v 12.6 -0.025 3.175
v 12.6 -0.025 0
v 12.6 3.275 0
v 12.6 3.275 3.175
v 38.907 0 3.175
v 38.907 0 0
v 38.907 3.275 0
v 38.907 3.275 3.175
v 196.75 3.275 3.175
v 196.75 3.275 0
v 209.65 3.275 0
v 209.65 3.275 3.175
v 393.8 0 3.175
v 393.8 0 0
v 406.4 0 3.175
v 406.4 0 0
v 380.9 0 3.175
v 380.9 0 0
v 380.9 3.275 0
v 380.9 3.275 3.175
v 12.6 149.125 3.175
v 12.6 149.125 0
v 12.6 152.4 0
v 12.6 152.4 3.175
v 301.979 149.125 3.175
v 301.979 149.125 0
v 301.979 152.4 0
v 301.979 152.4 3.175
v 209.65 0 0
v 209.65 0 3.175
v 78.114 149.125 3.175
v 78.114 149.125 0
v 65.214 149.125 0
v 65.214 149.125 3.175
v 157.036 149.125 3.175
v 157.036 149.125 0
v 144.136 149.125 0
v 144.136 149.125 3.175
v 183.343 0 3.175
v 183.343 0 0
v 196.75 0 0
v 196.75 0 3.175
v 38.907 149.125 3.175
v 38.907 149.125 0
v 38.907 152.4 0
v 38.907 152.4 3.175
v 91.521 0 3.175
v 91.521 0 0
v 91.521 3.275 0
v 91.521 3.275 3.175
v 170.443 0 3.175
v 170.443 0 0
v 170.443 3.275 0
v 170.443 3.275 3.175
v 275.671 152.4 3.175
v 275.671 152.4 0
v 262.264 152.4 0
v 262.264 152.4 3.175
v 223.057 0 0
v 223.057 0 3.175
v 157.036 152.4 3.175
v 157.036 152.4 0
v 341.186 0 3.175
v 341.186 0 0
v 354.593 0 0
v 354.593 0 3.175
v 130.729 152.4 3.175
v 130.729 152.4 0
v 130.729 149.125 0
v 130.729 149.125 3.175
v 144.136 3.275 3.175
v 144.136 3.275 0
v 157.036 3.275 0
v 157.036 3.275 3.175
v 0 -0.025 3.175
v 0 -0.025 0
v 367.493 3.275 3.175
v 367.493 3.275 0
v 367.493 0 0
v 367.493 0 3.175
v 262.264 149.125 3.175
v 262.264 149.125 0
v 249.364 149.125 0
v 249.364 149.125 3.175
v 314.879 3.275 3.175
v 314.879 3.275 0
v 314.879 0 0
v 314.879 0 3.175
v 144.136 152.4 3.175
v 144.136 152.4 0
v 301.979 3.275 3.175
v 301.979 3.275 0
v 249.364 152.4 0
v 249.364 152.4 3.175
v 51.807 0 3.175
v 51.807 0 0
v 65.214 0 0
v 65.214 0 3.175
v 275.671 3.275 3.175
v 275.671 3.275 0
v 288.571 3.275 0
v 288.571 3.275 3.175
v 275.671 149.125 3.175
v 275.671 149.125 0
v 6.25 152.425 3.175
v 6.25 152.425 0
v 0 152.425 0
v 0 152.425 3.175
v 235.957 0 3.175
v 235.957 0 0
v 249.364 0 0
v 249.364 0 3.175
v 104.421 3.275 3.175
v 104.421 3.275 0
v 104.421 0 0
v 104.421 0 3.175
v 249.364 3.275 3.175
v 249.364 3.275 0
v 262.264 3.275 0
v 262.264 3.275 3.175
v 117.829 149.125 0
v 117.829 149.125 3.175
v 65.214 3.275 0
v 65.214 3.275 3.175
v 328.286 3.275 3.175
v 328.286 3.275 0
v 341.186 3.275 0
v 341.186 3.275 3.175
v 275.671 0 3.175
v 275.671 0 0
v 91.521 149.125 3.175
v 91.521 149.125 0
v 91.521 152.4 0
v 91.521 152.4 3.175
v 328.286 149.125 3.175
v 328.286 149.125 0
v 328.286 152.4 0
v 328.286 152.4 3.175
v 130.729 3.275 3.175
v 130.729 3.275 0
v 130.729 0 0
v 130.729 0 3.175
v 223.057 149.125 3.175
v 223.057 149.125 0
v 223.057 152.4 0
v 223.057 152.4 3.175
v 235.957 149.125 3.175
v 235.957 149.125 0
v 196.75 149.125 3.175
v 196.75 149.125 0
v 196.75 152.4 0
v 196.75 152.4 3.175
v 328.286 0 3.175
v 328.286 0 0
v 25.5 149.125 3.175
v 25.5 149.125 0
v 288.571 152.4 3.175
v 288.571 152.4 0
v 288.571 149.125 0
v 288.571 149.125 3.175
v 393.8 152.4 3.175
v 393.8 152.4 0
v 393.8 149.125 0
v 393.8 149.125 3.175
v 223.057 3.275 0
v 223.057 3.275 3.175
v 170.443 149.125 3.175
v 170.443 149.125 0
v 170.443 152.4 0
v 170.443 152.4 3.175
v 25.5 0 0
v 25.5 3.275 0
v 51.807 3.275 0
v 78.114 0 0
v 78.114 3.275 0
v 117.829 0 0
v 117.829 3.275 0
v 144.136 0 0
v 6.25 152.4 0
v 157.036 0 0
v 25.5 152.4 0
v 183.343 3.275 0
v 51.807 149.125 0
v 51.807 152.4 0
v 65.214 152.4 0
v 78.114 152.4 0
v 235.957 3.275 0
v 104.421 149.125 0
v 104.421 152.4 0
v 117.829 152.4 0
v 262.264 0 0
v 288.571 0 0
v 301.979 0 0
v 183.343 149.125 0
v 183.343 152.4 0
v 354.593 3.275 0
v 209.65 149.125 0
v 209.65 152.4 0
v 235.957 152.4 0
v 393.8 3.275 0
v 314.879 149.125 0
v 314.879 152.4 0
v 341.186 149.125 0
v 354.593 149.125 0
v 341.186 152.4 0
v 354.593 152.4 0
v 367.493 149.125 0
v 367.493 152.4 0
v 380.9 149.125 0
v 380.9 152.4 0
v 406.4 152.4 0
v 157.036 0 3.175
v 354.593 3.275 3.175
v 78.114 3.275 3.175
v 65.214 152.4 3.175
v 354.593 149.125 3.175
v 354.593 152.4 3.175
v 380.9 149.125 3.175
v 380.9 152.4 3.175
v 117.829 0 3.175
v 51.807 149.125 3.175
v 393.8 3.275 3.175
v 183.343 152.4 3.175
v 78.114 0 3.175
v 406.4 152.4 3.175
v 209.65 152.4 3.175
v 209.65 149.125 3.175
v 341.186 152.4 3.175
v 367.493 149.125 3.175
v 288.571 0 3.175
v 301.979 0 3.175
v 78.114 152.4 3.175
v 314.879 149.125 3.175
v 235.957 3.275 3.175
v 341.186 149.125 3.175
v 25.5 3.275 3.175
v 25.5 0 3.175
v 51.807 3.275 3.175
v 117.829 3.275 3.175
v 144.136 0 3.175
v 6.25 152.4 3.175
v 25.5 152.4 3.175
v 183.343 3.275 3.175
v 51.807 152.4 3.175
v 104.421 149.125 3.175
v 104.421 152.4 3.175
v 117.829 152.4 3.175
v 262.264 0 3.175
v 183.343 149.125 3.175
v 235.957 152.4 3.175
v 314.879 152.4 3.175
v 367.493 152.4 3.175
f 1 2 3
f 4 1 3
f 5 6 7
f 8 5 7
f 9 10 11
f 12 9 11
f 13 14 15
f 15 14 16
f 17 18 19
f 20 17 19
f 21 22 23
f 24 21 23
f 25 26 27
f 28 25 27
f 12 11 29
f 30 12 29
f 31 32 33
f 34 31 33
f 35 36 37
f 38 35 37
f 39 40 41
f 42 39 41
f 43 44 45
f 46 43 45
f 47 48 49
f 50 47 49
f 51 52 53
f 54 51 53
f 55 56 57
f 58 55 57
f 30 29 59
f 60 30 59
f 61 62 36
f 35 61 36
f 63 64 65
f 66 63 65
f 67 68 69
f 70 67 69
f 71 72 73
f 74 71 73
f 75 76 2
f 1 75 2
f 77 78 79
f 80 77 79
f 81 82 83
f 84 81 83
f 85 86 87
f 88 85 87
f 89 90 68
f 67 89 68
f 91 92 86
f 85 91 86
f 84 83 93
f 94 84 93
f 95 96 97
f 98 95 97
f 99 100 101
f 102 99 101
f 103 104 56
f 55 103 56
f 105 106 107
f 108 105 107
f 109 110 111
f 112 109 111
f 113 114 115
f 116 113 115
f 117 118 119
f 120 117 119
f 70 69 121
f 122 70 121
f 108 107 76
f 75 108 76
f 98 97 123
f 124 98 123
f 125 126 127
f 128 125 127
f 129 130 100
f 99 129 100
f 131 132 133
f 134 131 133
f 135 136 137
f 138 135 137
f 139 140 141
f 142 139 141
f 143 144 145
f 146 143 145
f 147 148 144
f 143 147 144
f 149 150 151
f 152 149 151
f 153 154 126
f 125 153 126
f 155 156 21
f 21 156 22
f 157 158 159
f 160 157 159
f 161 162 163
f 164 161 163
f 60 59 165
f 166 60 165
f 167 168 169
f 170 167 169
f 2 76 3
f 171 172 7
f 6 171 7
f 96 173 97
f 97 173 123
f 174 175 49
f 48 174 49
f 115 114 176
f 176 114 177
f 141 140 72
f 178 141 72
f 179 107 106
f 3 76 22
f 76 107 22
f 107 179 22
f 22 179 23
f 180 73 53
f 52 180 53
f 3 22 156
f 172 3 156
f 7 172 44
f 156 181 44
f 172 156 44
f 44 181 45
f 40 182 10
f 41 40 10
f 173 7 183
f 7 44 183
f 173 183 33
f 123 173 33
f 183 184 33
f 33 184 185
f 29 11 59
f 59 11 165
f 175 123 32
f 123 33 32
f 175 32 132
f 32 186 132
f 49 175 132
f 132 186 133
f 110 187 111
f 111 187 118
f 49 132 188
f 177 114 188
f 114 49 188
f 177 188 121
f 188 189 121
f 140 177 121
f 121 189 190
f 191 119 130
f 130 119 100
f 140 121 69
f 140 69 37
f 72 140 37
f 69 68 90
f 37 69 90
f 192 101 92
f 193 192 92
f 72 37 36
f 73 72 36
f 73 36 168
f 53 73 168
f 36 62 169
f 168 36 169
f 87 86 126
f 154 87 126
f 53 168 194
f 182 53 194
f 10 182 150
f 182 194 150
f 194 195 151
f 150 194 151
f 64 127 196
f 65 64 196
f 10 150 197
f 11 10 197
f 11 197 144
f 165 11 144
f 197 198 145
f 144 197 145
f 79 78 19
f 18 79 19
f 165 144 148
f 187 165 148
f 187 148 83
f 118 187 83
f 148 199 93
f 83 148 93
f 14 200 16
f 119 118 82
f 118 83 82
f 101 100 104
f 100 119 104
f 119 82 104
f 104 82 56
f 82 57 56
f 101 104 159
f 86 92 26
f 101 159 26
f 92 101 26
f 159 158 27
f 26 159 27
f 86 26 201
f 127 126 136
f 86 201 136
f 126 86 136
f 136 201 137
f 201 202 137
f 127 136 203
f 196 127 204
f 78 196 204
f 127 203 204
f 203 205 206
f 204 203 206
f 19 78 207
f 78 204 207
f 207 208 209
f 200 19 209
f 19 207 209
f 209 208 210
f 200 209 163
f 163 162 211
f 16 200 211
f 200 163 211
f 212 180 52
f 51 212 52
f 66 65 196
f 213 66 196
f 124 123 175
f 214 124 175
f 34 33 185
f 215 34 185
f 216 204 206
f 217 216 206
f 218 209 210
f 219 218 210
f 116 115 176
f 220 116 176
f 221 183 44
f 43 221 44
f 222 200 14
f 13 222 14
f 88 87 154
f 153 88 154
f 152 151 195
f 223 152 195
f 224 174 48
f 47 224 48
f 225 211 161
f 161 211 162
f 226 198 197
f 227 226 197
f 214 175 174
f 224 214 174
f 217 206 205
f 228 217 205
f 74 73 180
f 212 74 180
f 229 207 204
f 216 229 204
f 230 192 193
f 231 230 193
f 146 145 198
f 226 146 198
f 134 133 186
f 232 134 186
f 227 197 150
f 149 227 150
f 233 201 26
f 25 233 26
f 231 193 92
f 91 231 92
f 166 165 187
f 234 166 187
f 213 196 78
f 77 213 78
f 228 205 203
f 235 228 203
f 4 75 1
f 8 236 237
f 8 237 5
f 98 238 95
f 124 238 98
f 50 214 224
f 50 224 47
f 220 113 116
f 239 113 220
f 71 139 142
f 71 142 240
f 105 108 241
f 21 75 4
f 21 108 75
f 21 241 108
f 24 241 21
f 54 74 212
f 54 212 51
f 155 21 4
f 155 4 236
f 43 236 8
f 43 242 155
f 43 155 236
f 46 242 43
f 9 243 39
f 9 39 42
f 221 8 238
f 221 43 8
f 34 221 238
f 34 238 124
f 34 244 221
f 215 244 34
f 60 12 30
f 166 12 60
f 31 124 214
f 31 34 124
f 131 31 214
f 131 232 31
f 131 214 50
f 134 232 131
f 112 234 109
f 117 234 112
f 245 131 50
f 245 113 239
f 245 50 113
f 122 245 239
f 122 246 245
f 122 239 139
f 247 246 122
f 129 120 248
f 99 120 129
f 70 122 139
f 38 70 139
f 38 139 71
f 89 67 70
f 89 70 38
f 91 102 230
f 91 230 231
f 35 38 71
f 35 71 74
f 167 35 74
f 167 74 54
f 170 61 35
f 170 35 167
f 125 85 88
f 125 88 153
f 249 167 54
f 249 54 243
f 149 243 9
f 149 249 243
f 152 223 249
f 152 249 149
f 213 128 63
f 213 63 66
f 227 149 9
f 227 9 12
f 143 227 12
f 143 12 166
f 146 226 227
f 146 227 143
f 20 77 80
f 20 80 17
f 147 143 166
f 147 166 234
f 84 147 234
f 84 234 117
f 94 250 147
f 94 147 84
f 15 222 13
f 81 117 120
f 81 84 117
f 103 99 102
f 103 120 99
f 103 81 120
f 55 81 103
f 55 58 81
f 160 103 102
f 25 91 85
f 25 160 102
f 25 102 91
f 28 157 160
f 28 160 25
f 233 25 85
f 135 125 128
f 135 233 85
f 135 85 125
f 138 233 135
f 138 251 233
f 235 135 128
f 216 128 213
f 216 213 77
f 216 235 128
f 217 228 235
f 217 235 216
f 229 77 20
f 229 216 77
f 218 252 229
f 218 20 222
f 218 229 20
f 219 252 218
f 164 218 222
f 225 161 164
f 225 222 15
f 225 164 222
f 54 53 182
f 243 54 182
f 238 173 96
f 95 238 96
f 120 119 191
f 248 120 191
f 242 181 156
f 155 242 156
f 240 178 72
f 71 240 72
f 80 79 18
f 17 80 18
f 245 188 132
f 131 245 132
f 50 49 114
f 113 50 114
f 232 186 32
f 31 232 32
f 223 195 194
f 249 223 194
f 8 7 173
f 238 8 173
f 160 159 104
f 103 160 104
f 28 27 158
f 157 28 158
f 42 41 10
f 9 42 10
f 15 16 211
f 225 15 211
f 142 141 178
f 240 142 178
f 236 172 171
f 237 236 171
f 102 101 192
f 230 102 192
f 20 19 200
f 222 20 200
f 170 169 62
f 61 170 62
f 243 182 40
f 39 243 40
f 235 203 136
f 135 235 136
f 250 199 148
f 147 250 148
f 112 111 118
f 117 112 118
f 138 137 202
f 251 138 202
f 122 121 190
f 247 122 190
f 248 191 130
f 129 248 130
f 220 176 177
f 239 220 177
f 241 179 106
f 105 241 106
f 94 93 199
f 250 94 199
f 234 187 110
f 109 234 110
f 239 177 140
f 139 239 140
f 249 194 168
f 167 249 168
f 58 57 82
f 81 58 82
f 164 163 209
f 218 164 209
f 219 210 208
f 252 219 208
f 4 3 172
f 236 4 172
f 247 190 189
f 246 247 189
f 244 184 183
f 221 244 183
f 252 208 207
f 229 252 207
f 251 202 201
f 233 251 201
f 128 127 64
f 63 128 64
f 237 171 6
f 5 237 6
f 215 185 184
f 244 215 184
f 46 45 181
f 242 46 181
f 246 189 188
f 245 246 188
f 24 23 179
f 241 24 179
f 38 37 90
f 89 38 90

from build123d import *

# Parameters (mm, degrees)
BOSS_EXTRUDE2_DEPTH = 3.175


with BuildPart() as part:
    # Sketch1 → Boss-Extrude2 (new body)
    with BuildSketch(Plane.XY):
        Polygon((393.8, 152.4), (393.8, 149.125), (380.9, 149.125), (380.9, 152.4), (367.492857143, 152.4), (367.492857143, 149.125), (354.592857143, 149.125), (354.592857143, 152.4), (341.185714286, 152.4), (341.185714286, 149.125), (328.285714286, 149.125), (328.285714286, 152.4), (314.878571429, 152.4), (314.878571429, 149.125), (301.978571429, 149.125), (301.978571429, 152.4), (288.571428571, 152.4), (288.571428571, 149.125), (275.671428571, 149.125), (275.671428571, 152.4), (262.264285714, 152.4), (262.264285714, 149.125), (249.364285714, 149.125), (249.364285714, 152.4), (235.957142857, 152.4), (235.957142857, 149.125), (223.057142857, 149.125), (223.057142857, 152.4), (209.65, 152.4), (209.65, 149.125), (196.75, 149.125), (196.75, 152.4), (183.342857143, 152.4), (183.342857143, 149.125), (170.442857143, 149.125), (170.442857143, 152.4), (157.035714286, 152.4), (157.035714286, 149.125), (144.135714286, 149.125), (144.135714286, 152.4), (130.728571429, 152.4), (130.728571429, 149.125), (117.828571429, 149.125), (117.828571429, 152.4), (104.421428571, 152.4), (104.421428571, 149.125), (91.521428571, 149.125), (91.521428571, 152.4), (78.114285714, 152.4), (78.114285714, 149.125), (65.214285714, 149.125), (65.214285714, 152.4), (51.807142857, 152.4), (51.807142857, 149.125), (38.907142857, 149.125), (38.907142857, 152.4), (25.5, 152.4), (25.5, 149.125), (12.6, 149.125), (12.6, 152.4), (6.2500002, 152.4), (6.2500002, 152.4254), (0, 152.4254), (0, -0.0254), (12.6000002, -0.0254), (12.6, 3.275), (25.5, 3.275), (25.5, 0), (38.907142857, 0), (38.907142857, 3.275), (51.807142857, 3.275), (51.807142857, 0), (65.214285714, 0), (65.214285714, 3.275), (78.114285714, 3.275), (78.114285714, 0), (91.521428571, 0), (91.521428571, 3.275), (104.421428571, 3.275), (104.421428571, 0), (117.828571429, 0), (117.828571429, 3.275), (130.728571429, 3.275), (130.728571429, 0), (144.135714286, 0), (144.135714286, 3.275), (157.035714286, 3.275), (157.035714286, 0), (170.442857143, 0), (170.442857143, 3.275), (183.342857143, 3.275), (183.342857143, 0), (196.75, 0), (196.75, 3.275), (209.65, 3.275), (209.65, 0), (223.057142857, 0), (223.057142857, 3.275), (235.957142857, 3.275), (235.957142857, 0), (249.364285714, 0), (249.364285714, 3.275), (262.264285714, 3.275), (262.264285714, 0), (275.671428571, 0), (275.671428571, 3.275), (288.571428571, 3.275), (288.571428571, 0), (301.978571429, 0), (301.978571429, 3.275), (314.878571429, 3.275), (314.878571429, 0), (328.285714286, 0), (328.285714286, 3.275), (341.185714286, 3.275), (341.185714286, 0), (354.592857143, 0), (354.592857143, 3.275), (367.492857143, 3.275), (367.492857143, 0), (380.9, 0), (380.9, 3.275), (393.8, 3.275), (393.8, 0), (406.4, 0), (406.4, 152.4), align=None)
    extrude(amount=BOSS_EXTRUDE2_DEPTH)


solid = part.part
